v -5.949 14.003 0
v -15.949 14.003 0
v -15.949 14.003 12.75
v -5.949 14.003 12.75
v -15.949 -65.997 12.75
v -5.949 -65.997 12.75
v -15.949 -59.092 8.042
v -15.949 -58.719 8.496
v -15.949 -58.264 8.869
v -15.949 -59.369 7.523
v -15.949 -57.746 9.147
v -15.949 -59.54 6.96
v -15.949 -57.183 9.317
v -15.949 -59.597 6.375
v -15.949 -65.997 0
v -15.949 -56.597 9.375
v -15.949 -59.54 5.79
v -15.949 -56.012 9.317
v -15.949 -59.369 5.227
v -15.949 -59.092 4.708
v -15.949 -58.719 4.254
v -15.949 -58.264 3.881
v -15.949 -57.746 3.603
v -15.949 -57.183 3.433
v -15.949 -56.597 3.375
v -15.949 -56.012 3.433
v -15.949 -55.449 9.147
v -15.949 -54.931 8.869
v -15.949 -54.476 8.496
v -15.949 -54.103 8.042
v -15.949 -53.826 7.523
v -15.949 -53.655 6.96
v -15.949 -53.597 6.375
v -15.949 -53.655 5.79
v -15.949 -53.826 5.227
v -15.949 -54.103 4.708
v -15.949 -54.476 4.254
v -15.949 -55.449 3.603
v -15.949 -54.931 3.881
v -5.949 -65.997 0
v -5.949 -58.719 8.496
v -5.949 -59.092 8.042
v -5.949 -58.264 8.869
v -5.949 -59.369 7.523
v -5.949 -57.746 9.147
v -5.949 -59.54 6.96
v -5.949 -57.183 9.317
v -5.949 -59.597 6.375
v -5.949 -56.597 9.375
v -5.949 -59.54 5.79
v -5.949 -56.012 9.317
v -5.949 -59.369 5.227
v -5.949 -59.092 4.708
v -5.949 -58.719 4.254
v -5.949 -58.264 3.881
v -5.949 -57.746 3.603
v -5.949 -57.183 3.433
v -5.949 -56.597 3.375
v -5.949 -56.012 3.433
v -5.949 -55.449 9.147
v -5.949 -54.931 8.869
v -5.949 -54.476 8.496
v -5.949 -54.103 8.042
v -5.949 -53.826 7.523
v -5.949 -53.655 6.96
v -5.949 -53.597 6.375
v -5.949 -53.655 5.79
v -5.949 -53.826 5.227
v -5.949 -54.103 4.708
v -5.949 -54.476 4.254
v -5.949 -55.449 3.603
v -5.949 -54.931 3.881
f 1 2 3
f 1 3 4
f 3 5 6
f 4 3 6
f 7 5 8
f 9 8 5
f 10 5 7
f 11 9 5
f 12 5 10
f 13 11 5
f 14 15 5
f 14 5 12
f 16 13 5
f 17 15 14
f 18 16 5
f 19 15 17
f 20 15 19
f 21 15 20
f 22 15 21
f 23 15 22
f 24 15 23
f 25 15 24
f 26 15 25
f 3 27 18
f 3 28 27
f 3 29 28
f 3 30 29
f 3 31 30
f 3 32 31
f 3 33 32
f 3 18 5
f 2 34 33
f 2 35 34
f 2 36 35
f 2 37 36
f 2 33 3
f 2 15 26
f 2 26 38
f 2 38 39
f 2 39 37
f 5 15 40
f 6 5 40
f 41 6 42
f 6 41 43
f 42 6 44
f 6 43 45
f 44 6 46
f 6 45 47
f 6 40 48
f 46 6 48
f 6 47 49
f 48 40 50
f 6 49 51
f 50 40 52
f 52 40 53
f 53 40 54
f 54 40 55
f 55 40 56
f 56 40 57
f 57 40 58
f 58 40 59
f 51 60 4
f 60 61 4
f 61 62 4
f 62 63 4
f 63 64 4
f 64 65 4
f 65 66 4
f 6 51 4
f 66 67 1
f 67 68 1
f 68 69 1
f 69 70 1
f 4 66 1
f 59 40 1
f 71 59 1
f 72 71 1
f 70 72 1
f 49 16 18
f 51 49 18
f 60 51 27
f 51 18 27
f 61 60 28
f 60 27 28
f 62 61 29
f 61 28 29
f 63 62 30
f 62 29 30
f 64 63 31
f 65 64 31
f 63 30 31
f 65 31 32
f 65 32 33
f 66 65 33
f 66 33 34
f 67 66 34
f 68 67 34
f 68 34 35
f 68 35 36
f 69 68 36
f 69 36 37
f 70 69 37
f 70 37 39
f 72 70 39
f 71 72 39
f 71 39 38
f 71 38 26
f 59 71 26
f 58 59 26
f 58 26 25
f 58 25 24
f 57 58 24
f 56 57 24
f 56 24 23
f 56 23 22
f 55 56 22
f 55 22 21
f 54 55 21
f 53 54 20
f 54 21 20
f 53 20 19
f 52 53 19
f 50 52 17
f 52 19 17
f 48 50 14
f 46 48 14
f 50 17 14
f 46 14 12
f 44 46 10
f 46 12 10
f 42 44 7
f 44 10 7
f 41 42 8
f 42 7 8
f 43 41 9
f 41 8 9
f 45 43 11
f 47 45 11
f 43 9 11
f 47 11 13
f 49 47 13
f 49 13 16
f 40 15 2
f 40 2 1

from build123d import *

# Parameters (mm, degrees)
SKIZZE1_W                       = 10
SKIZZE1_H                       = 80
AUFSATZ_LINEAR_AUSTRAGEN1_DEPTH = 12.75
F_6_0_6_DURCHMESSER_BOHRUNG1_D  = 6


with BuildPart() as part:
    # Skizze1 → Aufsatz-Linear austragen1 (new body)
    with BuildSketch(Plane.XY):
        with Locations((-10.949316523, -25.997467638)):
            Rectangle(SKIZZE1_W, SKIZZE1_H)
    extrude(amount=AUFSATZ_LINEAR_AUSTRAGEN1_DEPTH)

    # Ø6.0 (6) Durchmesser Bohrung1 (through all)
    with Locations(Plane(origin=(-5.949316523, 0, 0), x_dir=(0, 0, -1), z_dir=(1, 0, 0))):
        with Locations((-6.375, -56.597467638)):
            Hole(F_6_0_6_DURCHMESSER_BOHRUNG1_D / 2)


solid = part.part
